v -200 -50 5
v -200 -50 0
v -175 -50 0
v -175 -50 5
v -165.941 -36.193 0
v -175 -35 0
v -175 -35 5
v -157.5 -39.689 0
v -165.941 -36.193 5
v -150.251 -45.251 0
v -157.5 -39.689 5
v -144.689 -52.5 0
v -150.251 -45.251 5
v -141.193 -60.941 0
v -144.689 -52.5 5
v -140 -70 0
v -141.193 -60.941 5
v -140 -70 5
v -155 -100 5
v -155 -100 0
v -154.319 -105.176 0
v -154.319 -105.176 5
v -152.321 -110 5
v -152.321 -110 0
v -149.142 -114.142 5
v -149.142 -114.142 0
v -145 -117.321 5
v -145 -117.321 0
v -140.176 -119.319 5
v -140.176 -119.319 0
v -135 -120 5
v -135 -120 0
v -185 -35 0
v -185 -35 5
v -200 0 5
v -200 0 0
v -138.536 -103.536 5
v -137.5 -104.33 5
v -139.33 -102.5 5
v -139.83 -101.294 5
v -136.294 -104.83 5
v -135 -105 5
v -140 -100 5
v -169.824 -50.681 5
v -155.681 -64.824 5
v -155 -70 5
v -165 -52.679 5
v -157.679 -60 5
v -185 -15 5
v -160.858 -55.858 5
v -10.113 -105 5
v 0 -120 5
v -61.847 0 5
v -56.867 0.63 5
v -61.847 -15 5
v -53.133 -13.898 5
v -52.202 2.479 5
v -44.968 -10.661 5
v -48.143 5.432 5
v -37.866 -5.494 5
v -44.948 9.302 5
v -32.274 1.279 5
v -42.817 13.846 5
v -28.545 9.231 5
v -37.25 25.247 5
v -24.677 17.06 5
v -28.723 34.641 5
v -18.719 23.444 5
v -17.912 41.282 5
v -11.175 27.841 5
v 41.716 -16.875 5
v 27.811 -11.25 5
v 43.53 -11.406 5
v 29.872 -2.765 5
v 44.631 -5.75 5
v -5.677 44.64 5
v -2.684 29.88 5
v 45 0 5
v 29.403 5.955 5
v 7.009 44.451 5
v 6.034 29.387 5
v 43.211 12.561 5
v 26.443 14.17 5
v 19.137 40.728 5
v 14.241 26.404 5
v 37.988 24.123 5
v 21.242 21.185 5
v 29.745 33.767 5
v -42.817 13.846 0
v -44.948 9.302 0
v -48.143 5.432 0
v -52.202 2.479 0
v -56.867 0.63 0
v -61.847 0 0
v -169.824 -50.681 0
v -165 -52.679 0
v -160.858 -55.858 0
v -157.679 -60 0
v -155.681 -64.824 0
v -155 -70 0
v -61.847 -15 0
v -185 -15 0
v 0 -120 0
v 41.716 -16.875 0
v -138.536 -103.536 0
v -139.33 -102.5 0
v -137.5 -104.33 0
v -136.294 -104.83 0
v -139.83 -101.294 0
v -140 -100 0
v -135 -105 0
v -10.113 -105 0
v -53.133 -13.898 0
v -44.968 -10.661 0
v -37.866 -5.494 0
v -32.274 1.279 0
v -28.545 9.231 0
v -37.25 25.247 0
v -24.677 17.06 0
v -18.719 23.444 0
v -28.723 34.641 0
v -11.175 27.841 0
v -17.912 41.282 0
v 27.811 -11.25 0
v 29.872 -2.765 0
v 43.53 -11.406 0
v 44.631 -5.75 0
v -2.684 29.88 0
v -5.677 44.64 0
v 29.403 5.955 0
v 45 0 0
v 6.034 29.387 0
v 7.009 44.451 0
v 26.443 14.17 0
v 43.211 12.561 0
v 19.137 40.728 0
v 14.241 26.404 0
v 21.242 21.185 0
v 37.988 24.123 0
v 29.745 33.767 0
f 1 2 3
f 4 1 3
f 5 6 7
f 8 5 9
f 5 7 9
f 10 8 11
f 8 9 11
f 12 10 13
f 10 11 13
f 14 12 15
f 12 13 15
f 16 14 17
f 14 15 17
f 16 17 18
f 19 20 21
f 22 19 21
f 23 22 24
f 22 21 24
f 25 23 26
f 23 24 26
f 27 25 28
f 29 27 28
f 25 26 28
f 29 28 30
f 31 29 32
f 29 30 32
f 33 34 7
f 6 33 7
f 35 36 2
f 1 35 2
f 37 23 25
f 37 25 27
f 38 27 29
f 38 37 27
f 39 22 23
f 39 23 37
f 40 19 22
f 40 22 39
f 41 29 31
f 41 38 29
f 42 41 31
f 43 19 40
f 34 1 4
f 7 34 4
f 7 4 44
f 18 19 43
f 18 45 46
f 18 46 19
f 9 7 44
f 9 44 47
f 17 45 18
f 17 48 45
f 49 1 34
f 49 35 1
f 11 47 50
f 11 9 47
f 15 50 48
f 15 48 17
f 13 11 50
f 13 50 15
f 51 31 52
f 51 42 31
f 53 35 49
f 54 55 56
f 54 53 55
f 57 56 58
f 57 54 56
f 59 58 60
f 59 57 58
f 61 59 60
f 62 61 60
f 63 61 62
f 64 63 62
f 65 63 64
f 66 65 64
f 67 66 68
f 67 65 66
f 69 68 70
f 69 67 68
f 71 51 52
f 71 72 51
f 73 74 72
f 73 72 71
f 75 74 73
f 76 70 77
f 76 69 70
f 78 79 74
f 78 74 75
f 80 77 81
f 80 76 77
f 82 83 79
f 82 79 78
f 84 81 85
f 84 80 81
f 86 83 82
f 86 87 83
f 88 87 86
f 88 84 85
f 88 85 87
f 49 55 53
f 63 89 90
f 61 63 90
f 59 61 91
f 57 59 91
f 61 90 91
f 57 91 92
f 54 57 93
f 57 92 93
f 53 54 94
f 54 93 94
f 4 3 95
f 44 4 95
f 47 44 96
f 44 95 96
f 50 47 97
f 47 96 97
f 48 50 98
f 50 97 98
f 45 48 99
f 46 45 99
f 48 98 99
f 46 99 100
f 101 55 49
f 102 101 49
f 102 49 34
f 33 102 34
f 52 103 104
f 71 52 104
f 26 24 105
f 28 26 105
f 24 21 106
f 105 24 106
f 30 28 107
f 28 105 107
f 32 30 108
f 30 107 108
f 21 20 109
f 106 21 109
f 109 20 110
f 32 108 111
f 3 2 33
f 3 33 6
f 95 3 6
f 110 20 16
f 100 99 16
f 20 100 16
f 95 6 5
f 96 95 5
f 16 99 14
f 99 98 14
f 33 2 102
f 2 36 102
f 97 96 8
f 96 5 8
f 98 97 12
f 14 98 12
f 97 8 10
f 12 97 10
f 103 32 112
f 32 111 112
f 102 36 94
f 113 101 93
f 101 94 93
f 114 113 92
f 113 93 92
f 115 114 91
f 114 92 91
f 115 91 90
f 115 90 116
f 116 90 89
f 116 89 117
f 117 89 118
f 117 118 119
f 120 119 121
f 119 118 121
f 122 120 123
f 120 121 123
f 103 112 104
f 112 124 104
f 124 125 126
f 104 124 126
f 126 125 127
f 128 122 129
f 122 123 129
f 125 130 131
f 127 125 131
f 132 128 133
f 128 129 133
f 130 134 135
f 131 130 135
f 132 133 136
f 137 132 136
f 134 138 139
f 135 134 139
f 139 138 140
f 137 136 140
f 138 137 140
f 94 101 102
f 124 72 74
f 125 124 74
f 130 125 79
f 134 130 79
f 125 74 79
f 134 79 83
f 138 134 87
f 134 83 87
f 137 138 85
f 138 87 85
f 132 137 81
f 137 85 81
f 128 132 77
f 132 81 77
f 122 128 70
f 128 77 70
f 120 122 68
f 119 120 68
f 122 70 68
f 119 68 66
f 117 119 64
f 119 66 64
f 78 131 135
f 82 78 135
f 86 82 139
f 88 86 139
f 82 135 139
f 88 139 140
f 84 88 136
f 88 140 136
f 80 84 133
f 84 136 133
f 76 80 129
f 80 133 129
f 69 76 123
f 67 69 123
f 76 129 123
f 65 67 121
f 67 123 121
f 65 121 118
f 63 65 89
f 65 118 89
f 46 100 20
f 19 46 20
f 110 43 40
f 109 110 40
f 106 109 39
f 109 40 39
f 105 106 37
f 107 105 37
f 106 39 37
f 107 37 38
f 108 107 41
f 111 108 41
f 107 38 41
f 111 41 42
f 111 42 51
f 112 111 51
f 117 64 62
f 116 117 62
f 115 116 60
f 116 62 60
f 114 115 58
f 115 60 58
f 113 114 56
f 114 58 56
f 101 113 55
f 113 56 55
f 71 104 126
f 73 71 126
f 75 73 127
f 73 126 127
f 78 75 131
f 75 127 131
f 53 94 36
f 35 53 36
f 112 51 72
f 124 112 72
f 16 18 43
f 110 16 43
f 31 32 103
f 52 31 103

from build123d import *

# Parameters (mm, degrees)
SKETCH1_R           = 20
BOSS_EXTRUDE1_DEPTH = 5
CUT_EXTRUDE1_DEPTH  = 6


with BuildPart() as part:
    # Sketch1 → Boss-Extrude1 (new body)
    with BuildSketch(Plane.XY):
        with BuildLine():
            Line((-135, -120), (0, -120))
            Line((0, -120), (0, -45))
            ThreePointArc((0, -45), (-31.819805153, -31.819805153), (-45, 0))
            Line((-45, 0), (-61.846584492, 0))
            Line((-61.846584492, 0), (-200, 0))
            Line((-200, 0), (-200, -50))
            Line((-200, -50), (-175, -50))
            Line((-175, -50), (-155, -50))
            Line((-155, -50), (-155, -70))
            Line((-155, -70), (-155, -100))
            ThreePointArc((-155, -100), (-135, -80), (-115, -100))
            ThreePointArc((-115, -100), (-120.857864376, -114.142135624), (-135, -120))
        make_face()
        with BuildLine():
            ThreePointArc((-45, 0), (-44.450866059, 7.008602326), (-42.816866375, 13.846153034))
            ThreePointArc((-42.816866375, 13.846153034), (-50.079616665, 3.827848916), (-61.846584492, 0))
            Line((-61.846584492, 0), (-45, 0))
        make_face()
        with Locations((-135, -100)):
            Circle(SKETCH1_R)
        with BuildLine():
            ThreePointArc((-175, -50), (-160.857864376, -55.857864376), (-155, -70))
            Line((-155, -70), (-155, -50))
            Line((-155, -50), (-175, -50))
        make_face()
        with BuildLine():
            Line((0, -120), (41.71611649, -16.875))
            ThreePointArc((41.71611649, -16.875), (25.155764747, -37.312028891), (0, -45))
            Line((0, -45), (0, -120))
        make_face()
        with BuildLine():
            ThreePointArc((0, -45), (25.155764747, -37.312028891), (41.71611649, -16.875))
            ThreePointArc((41.71611649, -16.875), (44.171400487, -8.595776811), (45, 0))
            ThreePointArc((45, 0), (7.008602326, 44.450866059), (-42.816866375, 13.846153034))
            ThreePointArc((-42.816866375, 13.846153034), (-44.450866059, 7.008602326), (-45, 0))
            Line((-45, 0), (0, 0))
            Line((0, 0), (0, -45))
        make_face()
        with BuildLine():
            ThreePointArc((-45, 0), (-31.819805153, -31.819805153), (0, -45))
            Line((0, -45), (0, 0))
            Line((0, 0), (-45, 0))
        make_face()
    extrude(amount=BOSS_EXTRUDE1_DEPTH)

    # Sketch2 → Cut-Extrude1 (cut, through all)
    with BuildSketch(Plane.XY.offset(5)):
        with BuildLine():
            Line((-61.846584384, -15), (-185, -15))
            Line((-185, -15), (-185, -35))
            Line((-185, -35), (-175, -35))
            ThreePointArc((-175, -35), (-150.251262658, -45.251262658), (-140, -70))
            Line((-140, -70), (-140, -100))
            ThreePointArc((-140, -100), (-138.535533906, -103.535533906), (-135, -105))
            Line((-135, -105), (-10.112997937, -105))
            Line((-10.112997937, -105), (27.810744327, -11.25))
            ThreePointArc((27.810744327, -11.25), (10.246955881, 28.195742501), (-28.544577408, 9.230769231))
            ThreePointArc((-28.544577408, 9.230769231), (-41.254390195, -8.301263902), (-61.846584384, -15))
        make_face()
    extrude(amount=-CUT_EXTRUDE1_DEPTH, mode=Mode.SUBTRACT)


solid = part.part
